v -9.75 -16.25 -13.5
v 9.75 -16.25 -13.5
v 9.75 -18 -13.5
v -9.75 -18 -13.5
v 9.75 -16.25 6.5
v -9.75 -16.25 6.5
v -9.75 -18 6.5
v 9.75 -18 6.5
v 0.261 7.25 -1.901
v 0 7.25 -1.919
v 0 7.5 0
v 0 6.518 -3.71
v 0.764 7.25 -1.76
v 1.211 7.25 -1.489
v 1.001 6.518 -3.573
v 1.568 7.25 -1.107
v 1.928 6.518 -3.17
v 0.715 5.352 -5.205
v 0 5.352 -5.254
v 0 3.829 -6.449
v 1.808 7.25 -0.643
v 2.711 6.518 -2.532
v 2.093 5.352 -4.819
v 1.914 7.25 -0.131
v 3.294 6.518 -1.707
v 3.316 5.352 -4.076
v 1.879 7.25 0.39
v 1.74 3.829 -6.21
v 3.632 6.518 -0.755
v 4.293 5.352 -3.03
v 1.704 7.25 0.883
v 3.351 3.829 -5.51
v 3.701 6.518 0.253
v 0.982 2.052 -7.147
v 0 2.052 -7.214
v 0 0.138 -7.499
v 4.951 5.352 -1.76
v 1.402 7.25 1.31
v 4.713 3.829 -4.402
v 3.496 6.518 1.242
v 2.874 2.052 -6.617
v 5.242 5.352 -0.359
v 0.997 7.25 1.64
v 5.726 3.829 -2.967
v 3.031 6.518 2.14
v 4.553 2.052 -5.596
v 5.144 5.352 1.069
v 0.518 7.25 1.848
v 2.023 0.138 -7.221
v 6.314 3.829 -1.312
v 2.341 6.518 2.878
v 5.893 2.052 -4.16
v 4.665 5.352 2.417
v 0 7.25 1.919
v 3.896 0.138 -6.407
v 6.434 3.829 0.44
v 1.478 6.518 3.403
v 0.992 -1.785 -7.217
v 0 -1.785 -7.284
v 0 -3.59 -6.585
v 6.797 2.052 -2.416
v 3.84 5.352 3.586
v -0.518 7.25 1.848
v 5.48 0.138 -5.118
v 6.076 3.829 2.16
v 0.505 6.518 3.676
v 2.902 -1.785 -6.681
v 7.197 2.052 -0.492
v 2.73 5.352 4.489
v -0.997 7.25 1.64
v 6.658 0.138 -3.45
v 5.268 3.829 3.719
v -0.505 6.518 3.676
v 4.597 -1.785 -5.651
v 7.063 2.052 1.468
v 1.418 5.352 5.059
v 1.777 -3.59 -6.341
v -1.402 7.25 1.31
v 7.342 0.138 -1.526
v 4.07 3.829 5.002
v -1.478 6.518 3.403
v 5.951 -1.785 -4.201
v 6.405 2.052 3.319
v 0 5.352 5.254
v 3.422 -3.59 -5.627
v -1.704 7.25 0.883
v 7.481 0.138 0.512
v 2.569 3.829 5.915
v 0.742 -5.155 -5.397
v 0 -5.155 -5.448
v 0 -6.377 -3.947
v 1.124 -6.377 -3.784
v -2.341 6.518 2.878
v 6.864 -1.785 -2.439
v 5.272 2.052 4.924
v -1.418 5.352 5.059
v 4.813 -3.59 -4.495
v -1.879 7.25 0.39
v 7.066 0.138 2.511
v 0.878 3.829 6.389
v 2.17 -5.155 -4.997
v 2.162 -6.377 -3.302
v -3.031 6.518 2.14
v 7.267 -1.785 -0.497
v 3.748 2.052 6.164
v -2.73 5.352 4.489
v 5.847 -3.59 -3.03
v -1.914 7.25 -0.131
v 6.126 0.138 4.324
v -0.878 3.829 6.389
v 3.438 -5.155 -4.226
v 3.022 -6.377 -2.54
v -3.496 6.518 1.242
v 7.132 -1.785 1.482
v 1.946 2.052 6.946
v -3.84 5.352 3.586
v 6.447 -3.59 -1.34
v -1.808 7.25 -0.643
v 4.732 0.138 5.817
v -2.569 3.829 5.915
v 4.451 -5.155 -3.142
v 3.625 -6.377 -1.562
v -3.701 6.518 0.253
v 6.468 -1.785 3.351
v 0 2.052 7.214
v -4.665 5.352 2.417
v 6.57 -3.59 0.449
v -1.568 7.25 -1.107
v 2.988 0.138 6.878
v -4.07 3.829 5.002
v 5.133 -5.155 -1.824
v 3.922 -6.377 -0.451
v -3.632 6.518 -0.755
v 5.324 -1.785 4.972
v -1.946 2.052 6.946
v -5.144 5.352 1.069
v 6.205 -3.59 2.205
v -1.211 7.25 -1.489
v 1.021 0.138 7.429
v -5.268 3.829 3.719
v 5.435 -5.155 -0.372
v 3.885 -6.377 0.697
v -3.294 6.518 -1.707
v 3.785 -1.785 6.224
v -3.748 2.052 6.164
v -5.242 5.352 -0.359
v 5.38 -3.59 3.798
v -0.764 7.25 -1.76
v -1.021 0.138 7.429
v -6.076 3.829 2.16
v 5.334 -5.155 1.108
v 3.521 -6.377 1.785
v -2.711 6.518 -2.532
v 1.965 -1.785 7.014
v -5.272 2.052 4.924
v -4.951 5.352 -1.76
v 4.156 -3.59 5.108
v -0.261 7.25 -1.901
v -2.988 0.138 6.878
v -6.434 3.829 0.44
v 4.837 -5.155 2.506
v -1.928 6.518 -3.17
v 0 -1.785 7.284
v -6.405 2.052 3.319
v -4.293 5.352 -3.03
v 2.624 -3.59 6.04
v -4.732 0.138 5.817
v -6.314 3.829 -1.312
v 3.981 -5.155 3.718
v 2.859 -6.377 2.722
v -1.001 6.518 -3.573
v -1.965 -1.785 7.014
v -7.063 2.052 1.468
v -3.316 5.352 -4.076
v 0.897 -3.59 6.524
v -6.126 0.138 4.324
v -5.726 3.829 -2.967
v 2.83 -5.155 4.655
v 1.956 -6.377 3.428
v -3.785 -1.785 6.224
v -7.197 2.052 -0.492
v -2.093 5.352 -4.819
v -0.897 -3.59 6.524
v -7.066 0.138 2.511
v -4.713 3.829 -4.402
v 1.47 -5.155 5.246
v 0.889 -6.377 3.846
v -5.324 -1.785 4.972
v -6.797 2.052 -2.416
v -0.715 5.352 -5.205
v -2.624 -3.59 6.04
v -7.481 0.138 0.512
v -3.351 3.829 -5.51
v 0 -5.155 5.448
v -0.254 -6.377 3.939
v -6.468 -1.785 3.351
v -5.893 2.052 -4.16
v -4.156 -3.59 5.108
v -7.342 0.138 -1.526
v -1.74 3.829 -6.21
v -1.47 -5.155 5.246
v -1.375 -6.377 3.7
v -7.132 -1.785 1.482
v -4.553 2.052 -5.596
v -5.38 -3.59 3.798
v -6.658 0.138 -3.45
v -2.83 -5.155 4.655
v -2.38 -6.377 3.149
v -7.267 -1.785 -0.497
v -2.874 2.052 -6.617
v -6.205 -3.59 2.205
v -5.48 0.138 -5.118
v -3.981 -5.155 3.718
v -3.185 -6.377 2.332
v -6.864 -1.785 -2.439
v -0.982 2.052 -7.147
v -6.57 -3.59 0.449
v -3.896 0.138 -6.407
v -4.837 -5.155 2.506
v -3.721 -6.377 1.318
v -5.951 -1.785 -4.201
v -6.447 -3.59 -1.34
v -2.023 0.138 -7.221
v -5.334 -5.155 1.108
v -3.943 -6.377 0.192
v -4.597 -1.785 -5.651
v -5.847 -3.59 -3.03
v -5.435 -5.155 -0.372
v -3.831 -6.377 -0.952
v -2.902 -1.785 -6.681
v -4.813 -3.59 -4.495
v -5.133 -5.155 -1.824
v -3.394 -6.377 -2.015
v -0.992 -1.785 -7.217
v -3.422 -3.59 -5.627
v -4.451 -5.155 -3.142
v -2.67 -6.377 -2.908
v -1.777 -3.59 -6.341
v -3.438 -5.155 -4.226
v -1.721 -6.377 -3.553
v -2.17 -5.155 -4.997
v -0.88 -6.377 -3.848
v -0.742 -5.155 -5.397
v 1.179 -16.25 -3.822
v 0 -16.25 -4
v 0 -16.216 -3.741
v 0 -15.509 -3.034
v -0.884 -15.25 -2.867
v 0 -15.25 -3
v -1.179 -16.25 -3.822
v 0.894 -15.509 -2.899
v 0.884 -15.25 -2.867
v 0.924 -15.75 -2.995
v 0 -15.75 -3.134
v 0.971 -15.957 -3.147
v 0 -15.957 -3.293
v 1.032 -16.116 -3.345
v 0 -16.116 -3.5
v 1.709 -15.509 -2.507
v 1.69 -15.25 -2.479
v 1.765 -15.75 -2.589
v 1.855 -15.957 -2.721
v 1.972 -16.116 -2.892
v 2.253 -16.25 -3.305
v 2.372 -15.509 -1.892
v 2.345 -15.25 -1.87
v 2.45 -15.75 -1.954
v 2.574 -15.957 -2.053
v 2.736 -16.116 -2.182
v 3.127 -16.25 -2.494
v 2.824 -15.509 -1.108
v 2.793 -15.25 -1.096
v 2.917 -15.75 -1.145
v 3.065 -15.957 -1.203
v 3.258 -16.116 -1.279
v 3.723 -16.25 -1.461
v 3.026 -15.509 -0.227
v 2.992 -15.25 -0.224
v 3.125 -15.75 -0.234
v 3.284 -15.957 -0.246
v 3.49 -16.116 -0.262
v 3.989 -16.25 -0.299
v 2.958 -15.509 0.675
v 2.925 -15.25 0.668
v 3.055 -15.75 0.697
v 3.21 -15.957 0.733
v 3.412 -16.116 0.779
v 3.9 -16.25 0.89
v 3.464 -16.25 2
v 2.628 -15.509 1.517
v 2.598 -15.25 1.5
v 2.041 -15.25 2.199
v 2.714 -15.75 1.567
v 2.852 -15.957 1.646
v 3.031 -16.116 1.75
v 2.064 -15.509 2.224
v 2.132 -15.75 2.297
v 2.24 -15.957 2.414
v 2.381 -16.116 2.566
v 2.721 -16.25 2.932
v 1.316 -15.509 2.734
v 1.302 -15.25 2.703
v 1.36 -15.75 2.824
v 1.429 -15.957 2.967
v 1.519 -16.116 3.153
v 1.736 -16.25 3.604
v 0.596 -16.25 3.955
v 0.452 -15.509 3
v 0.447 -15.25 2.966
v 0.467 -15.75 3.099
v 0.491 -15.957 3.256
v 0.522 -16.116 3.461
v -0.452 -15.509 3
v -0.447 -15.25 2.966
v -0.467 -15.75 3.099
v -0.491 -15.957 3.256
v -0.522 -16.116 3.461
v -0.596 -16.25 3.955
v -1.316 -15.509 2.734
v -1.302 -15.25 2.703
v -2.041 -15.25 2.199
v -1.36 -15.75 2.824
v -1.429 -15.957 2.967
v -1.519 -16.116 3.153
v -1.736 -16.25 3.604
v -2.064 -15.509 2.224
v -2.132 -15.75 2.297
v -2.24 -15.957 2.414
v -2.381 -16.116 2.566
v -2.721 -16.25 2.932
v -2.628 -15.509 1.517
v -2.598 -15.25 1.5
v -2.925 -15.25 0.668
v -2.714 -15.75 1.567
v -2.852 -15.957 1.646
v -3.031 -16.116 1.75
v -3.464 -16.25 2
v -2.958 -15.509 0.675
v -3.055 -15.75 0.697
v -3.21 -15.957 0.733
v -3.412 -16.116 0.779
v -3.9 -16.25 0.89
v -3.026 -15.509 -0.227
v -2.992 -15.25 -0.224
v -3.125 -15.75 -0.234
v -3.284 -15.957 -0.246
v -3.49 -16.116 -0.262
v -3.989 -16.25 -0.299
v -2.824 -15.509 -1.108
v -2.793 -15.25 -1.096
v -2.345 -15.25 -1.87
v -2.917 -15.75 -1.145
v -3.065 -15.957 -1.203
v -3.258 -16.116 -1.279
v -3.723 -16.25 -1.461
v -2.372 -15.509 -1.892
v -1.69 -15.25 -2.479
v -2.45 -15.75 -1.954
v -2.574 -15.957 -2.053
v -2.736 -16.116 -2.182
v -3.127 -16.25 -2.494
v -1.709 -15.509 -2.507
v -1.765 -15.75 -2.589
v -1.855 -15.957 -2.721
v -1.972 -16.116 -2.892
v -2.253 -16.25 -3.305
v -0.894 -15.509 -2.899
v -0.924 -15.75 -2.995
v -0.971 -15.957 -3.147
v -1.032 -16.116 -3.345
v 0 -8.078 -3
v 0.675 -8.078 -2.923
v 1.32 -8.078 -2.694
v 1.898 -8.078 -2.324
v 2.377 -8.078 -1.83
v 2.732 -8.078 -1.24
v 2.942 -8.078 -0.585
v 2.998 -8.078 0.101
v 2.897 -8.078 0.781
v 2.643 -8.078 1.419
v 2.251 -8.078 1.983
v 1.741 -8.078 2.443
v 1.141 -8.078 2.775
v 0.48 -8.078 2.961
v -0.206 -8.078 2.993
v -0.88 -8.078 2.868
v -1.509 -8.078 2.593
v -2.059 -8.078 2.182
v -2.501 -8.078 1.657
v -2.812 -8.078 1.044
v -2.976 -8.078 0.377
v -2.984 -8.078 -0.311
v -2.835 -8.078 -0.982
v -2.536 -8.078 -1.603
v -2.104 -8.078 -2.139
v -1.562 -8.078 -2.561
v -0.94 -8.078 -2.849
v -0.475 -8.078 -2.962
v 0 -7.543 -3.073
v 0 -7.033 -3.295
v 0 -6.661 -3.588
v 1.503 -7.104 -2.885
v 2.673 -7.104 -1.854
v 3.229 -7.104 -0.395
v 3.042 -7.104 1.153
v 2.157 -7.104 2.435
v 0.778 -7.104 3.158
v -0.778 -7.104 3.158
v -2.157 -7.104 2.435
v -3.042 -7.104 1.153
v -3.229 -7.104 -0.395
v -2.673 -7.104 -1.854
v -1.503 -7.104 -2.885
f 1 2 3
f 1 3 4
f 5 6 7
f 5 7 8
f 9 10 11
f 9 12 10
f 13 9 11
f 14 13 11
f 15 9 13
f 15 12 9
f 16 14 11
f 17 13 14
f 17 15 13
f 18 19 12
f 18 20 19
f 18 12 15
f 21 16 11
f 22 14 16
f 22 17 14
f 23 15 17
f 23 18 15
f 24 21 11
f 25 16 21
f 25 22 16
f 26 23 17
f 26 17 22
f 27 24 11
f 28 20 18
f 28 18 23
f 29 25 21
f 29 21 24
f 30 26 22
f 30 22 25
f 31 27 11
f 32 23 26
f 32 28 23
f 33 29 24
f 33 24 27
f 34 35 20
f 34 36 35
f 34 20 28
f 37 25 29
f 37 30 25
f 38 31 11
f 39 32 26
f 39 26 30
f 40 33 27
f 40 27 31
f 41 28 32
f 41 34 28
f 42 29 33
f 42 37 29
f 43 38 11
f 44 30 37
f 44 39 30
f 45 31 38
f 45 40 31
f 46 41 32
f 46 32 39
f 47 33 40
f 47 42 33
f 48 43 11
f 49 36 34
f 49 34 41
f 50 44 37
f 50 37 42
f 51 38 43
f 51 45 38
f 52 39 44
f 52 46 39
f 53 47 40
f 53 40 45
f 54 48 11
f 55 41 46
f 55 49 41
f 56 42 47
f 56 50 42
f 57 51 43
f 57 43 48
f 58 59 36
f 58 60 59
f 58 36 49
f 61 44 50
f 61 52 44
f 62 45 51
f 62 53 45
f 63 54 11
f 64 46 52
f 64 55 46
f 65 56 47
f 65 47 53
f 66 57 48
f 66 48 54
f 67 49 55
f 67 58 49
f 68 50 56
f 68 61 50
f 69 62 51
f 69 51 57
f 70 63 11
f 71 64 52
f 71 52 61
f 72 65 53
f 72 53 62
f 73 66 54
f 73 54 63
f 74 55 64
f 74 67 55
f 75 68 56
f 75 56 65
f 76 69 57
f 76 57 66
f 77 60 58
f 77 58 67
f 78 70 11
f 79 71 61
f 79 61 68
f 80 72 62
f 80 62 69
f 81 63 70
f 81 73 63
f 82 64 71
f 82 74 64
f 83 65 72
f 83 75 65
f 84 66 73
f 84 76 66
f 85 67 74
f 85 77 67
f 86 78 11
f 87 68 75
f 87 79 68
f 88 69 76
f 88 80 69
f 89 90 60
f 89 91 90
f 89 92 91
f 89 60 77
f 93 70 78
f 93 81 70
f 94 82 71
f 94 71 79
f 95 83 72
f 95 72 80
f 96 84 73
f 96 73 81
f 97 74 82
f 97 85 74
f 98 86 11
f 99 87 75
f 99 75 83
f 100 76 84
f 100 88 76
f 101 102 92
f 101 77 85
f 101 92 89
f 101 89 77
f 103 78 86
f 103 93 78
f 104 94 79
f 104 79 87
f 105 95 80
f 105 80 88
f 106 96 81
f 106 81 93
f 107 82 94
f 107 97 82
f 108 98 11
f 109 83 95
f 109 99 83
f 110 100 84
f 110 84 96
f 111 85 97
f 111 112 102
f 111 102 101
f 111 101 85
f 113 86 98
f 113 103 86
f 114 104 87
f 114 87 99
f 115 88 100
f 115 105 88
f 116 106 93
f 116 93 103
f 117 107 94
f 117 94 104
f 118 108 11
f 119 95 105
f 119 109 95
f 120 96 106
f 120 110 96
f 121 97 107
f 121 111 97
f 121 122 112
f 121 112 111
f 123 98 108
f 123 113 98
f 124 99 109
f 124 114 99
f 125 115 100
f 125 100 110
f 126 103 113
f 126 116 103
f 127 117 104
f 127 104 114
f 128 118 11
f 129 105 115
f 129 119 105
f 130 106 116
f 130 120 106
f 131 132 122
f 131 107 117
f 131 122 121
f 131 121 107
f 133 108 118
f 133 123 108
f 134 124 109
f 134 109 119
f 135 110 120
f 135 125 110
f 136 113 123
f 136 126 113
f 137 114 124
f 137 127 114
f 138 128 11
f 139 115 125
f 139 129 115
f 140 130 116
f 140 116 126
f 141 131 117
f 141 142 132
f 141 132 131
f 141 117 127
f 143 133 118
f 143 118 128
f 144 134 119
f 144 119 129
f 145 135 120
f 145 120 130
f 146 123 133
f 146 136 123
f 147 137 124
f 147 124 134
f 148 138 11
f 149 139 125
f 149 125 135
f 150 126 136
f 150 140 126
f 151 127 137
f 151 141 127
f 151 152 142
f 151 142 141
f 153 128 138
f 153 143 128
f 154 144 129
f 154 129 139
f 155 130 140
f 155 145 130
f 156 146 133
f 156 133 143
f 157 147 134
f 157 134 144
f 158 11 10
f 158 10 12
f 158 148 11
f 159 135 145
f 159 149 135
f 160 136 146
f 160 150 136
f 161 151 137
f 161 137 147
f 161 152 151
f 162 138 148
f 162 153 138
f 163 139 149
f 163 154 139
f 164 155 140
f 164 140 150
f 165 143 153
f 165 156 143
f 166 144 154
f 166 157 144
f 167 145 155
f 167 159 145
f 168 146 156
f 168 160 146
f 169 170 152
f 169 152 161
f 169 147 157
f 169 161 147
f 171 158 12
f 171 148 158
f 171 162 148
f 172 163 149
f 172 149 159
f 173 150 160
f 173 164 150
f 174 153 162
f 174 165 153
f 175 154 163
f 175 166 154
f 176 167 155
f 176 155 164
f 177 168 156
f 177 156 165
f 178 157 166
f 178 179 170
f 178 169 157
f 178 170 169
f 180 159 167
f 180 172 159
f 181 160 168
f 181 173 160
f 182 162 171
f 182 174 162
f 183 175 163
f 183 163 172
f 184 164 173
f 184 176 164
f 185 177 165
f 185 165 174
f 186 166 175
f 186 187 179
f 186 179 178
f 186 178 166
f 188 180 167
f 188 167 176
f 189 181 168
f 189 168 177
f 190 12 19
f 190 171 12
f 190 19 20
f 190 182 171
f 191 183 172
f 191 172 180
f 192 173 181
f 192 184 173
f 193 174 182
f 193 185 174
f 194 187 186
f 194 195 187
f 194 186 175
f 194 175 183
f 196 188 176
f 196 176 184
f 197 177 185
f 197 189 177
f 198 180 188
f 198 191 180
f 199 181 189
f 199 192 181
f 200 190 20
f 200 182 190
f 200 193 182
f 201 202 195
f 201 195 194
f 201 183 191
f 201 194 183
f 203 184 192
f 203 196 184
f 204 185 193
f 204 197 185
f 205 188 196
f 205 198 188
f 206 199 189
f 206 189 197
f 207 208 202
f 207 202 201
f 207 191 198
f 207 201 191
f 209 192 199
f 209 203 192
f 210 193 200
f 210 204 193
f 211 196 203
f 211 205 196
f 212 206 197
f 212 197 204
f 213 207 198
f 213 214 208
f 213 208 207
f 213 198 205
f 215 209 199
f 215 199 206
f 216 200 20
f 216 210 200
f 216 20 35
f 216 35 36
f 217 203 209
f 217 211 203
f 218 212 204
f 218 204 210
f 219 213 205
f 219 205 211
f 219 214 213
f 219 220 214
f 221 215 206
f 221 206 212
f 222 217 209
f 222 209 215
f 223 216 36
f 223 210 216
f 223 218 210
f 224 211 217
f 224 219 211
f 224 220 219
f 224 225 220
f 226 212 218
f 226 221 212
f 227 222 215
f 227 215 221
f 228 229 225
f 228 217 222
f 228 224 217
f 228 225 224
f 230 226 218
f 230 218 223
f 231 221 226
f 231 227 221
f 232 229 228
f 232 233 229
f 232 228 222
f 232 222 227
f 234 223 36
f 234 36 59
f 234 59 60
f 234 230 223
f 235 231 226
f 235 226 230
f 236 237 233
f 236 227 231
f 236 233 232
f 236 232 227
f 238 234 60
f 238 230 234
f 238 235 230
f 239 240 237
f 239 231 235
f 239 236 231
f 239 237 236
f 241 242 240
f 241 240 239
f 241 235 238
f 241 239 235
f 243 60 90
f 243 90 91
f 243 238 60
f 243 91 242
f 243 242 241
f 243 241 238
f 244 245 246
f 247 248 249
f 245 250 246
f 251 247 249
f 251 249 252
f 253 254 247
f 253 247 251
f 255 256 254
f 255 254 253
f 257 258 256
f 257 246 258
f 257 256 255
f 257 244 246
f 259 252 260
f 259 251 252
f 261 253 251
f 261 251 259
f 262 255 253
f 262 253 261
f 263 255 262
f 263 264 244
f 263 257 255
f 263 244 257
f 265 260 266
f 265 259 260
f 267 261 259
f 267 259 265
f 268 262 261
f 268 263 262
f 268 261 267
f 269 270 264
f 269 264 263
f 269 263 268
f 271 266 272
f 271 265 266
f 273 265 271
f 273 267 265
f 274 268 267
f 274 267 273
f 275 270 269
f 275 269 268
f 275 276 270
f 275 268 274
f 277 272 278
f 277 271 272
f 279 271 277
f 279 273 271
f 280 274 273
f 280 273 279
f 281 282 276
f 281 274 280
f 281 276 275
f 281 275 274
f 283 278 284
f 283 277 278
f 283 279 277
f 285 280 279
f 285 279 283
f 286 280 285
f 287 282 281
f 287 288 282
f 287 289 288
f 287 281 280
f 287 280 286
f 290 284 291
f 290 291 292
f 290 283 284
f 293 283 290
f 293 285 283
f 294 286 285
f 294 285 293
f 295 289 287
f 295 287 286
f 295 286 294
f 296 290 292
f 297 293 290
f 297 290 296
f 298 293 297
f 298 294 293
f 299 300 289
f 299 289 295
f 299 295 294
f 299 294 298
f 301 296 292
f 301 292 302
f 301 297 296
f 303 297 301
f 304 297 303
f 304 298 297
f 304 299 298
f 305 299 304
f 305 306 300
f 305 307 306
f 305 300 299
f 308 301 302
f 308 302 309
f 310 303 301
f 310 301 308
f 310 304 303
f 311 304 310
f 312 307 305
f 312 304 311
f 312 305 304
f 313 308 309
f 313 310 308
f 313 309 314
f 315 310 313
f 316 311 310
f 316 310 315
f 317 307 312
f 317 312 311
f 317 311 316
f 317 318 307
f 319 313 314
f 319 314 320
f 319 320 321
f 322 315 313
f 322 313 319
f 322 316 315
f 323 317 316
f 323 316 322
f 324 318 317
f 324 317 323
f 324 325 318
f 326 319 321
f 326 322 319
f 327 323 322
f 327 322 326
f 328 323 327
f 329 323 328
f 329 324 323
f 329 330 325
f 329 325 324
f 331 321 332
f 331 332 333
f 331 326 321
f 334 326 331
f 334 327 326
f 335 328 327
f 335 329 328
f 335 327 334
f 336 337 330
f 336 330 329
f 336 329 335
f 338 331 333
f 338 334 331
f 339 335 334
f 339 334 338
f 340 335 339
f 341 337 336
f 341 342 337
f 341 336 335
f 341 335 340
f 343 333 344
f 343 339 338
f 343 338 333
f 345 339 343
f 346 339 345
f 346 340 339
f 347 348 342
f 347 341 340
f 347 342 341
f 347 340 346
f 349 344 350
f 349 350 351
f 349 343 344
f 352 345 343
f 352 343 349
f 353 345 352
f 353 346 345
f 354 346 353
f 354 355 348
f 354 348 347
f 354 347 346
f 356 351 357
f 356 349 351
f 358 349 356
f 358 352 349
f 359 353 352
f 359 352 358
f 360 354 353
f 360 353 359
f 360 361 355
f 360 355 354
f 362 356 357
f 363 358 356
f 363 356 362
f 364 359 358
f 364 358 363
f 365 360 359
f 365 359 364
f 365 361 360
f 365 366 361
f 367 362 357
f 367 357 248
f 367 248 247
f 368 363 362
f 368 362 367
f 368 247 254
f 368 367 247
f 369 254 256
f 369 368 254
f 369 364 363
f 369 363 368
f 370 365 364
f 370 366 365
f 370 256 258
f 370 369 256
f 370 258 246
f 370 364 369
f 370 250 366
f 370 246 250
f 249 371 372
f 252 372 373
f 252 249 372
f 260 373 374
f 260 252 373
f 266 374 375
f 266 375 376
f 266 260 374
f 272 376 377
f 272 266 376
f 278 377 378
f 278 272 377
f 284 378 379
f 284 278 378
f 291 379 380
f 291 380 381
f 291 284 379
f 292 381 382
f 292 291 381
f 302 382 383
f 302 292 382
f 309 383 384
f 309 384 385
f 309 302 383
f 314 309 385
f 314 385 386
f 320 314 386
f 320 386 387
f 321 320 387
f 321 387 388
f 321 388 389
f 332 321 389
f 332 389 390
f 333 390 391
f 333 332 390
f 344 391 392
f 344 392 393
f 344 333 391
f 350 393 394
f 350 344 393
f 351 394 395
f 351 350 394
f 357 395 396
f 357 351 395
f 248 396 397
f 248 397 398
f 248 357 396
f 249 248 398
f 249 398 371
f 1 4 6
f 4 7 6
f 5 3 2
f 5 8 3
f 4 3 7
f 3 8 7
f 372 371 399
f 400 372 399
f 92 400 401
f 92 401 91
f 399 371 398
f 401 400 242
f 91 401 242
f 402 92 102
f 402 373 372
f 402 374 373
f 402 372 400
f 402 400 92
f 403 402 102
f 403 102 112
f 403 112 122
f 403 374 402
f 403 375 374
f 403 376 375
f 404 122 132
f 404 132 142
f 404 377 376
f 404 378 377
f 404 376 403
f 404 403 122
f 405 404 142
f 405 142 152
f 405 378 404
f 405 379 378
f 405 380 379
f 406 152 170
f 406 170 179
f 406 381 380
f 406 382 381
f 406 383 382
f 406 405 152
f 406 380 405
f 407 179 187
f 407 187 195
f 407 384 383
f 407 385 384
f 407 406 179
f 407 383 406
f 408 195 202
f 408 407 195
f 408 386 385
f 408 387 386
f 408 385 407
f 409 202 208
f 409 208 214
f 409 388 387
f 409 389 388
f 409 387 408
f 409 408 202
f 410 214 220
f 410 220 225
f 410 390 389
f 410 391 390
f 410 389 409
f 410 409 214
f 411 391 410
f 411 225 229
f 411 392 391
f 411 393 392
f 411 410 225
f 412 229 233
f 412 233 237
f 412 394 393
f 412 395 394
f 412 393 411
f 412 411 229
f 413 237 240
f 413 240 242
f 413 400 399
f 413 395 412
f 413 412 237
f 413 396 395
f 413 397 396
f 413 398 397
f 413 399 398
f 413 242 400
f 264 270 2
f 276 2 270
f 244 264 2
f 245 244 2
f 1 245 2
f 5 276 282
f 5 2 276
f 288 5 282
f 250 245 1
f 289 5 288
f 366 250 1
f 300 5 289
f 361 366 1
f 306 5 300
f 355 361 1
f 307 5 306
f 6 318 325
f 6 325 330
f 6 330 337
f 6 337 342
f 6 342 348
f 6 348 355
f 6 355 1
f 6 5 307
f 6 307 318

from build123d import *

# Parameters (mm, degrees)
SKETCH2_W           = 19.5
SKETCH2_H           = 20
BOSS_EXTRUDE1_DEPTH = 1.75
SKETCH3_W           = 19.5
SKETCH3_H           = 3.5
CUT_EXTRUDE1_DEPTH  = 2.75
SKETCH4_W           = 19.5
SKETCH4_H           = 1.75
BOSS_EXTRUDE2_DEPTH = 3.5
FILLET1_R           = 2
FILLET2_R           = 1


with BuildPart() as part:
    # Sketch1 → Revolve1 (revolve)
    with BuildSketch(Plane(origin=(0, 0, 0), x_dir=(0, 0, -1), z_dir=(1, 0, 0))):
        with BuildLine():
            Line((3, -6.873863542), (3, -16.25))
            Line((3, -16.25), (6, -16.25))
            Line((6, -16.25), (6, -18))
            Line((6, -18), (0, -18))
            Line((0, -18), (0, -7.5))
            Line((0, -7.5), (0, 7.5))
            ThreePointArc((0, 7.5), (7.341797347, 1.532322328), (3, -6.873863542))
        make_face()
    revolve(axis=Axis((0, 0, 0), (0, -1, 0)))

    # Sketch2 → Boss-Extrude1 (add)
    with BuildSketch(Plane.XZ.offset(18)):
        Rectangle(SKETCH2_W, SKETCH2_H)
    extrude(amount=-BOSS_EXTRUDE1_DEPTH)

    # Sketch3 → Cut-Extrude1 (cut, through all)
    with BuildSketch(Plane(origin=(0, -16.25, 0), x_dir=(1, 0, 0), z_dir=(0, 1, 0))):
        with Locations((0, -8.25)):
            Rectangle(SKETCH3_W, SKETCH3_H)
    extrude(amount=-CUT_EXTRUDE1_DEPTH, mode=Mode.SUBTRACT)

    # Sketch4 → Boss-Extrude2 (add)
    with BuildSketch(Plane(origin=(0, 0, -10), x_dir=(-1, 0, 0), z_dir=(0, 0, -1))):
        with Locations((0, -17.125)):
            Rectangle(SKETCH4_W, SKETCH4_H)
    extrude(amount=BOSS_EXTRUDE2_DEPTH)

    # Fillet1
    fillet1_edges = [part.edges().sort_by_distance(p)[0] for p in [
        (0, -6.873863542, 3),
    ]]
    fillet(fillet1_edges, radius=FILLET1_R)

    # Fillet2
    fillet2_edges = [part.edges().sort_by_distance(p)[0] for p in [
        (0, -16.25, 3),
    ]]
    fillet(fillet2_edges, radius=FILLET2_R)


solid = part.part
